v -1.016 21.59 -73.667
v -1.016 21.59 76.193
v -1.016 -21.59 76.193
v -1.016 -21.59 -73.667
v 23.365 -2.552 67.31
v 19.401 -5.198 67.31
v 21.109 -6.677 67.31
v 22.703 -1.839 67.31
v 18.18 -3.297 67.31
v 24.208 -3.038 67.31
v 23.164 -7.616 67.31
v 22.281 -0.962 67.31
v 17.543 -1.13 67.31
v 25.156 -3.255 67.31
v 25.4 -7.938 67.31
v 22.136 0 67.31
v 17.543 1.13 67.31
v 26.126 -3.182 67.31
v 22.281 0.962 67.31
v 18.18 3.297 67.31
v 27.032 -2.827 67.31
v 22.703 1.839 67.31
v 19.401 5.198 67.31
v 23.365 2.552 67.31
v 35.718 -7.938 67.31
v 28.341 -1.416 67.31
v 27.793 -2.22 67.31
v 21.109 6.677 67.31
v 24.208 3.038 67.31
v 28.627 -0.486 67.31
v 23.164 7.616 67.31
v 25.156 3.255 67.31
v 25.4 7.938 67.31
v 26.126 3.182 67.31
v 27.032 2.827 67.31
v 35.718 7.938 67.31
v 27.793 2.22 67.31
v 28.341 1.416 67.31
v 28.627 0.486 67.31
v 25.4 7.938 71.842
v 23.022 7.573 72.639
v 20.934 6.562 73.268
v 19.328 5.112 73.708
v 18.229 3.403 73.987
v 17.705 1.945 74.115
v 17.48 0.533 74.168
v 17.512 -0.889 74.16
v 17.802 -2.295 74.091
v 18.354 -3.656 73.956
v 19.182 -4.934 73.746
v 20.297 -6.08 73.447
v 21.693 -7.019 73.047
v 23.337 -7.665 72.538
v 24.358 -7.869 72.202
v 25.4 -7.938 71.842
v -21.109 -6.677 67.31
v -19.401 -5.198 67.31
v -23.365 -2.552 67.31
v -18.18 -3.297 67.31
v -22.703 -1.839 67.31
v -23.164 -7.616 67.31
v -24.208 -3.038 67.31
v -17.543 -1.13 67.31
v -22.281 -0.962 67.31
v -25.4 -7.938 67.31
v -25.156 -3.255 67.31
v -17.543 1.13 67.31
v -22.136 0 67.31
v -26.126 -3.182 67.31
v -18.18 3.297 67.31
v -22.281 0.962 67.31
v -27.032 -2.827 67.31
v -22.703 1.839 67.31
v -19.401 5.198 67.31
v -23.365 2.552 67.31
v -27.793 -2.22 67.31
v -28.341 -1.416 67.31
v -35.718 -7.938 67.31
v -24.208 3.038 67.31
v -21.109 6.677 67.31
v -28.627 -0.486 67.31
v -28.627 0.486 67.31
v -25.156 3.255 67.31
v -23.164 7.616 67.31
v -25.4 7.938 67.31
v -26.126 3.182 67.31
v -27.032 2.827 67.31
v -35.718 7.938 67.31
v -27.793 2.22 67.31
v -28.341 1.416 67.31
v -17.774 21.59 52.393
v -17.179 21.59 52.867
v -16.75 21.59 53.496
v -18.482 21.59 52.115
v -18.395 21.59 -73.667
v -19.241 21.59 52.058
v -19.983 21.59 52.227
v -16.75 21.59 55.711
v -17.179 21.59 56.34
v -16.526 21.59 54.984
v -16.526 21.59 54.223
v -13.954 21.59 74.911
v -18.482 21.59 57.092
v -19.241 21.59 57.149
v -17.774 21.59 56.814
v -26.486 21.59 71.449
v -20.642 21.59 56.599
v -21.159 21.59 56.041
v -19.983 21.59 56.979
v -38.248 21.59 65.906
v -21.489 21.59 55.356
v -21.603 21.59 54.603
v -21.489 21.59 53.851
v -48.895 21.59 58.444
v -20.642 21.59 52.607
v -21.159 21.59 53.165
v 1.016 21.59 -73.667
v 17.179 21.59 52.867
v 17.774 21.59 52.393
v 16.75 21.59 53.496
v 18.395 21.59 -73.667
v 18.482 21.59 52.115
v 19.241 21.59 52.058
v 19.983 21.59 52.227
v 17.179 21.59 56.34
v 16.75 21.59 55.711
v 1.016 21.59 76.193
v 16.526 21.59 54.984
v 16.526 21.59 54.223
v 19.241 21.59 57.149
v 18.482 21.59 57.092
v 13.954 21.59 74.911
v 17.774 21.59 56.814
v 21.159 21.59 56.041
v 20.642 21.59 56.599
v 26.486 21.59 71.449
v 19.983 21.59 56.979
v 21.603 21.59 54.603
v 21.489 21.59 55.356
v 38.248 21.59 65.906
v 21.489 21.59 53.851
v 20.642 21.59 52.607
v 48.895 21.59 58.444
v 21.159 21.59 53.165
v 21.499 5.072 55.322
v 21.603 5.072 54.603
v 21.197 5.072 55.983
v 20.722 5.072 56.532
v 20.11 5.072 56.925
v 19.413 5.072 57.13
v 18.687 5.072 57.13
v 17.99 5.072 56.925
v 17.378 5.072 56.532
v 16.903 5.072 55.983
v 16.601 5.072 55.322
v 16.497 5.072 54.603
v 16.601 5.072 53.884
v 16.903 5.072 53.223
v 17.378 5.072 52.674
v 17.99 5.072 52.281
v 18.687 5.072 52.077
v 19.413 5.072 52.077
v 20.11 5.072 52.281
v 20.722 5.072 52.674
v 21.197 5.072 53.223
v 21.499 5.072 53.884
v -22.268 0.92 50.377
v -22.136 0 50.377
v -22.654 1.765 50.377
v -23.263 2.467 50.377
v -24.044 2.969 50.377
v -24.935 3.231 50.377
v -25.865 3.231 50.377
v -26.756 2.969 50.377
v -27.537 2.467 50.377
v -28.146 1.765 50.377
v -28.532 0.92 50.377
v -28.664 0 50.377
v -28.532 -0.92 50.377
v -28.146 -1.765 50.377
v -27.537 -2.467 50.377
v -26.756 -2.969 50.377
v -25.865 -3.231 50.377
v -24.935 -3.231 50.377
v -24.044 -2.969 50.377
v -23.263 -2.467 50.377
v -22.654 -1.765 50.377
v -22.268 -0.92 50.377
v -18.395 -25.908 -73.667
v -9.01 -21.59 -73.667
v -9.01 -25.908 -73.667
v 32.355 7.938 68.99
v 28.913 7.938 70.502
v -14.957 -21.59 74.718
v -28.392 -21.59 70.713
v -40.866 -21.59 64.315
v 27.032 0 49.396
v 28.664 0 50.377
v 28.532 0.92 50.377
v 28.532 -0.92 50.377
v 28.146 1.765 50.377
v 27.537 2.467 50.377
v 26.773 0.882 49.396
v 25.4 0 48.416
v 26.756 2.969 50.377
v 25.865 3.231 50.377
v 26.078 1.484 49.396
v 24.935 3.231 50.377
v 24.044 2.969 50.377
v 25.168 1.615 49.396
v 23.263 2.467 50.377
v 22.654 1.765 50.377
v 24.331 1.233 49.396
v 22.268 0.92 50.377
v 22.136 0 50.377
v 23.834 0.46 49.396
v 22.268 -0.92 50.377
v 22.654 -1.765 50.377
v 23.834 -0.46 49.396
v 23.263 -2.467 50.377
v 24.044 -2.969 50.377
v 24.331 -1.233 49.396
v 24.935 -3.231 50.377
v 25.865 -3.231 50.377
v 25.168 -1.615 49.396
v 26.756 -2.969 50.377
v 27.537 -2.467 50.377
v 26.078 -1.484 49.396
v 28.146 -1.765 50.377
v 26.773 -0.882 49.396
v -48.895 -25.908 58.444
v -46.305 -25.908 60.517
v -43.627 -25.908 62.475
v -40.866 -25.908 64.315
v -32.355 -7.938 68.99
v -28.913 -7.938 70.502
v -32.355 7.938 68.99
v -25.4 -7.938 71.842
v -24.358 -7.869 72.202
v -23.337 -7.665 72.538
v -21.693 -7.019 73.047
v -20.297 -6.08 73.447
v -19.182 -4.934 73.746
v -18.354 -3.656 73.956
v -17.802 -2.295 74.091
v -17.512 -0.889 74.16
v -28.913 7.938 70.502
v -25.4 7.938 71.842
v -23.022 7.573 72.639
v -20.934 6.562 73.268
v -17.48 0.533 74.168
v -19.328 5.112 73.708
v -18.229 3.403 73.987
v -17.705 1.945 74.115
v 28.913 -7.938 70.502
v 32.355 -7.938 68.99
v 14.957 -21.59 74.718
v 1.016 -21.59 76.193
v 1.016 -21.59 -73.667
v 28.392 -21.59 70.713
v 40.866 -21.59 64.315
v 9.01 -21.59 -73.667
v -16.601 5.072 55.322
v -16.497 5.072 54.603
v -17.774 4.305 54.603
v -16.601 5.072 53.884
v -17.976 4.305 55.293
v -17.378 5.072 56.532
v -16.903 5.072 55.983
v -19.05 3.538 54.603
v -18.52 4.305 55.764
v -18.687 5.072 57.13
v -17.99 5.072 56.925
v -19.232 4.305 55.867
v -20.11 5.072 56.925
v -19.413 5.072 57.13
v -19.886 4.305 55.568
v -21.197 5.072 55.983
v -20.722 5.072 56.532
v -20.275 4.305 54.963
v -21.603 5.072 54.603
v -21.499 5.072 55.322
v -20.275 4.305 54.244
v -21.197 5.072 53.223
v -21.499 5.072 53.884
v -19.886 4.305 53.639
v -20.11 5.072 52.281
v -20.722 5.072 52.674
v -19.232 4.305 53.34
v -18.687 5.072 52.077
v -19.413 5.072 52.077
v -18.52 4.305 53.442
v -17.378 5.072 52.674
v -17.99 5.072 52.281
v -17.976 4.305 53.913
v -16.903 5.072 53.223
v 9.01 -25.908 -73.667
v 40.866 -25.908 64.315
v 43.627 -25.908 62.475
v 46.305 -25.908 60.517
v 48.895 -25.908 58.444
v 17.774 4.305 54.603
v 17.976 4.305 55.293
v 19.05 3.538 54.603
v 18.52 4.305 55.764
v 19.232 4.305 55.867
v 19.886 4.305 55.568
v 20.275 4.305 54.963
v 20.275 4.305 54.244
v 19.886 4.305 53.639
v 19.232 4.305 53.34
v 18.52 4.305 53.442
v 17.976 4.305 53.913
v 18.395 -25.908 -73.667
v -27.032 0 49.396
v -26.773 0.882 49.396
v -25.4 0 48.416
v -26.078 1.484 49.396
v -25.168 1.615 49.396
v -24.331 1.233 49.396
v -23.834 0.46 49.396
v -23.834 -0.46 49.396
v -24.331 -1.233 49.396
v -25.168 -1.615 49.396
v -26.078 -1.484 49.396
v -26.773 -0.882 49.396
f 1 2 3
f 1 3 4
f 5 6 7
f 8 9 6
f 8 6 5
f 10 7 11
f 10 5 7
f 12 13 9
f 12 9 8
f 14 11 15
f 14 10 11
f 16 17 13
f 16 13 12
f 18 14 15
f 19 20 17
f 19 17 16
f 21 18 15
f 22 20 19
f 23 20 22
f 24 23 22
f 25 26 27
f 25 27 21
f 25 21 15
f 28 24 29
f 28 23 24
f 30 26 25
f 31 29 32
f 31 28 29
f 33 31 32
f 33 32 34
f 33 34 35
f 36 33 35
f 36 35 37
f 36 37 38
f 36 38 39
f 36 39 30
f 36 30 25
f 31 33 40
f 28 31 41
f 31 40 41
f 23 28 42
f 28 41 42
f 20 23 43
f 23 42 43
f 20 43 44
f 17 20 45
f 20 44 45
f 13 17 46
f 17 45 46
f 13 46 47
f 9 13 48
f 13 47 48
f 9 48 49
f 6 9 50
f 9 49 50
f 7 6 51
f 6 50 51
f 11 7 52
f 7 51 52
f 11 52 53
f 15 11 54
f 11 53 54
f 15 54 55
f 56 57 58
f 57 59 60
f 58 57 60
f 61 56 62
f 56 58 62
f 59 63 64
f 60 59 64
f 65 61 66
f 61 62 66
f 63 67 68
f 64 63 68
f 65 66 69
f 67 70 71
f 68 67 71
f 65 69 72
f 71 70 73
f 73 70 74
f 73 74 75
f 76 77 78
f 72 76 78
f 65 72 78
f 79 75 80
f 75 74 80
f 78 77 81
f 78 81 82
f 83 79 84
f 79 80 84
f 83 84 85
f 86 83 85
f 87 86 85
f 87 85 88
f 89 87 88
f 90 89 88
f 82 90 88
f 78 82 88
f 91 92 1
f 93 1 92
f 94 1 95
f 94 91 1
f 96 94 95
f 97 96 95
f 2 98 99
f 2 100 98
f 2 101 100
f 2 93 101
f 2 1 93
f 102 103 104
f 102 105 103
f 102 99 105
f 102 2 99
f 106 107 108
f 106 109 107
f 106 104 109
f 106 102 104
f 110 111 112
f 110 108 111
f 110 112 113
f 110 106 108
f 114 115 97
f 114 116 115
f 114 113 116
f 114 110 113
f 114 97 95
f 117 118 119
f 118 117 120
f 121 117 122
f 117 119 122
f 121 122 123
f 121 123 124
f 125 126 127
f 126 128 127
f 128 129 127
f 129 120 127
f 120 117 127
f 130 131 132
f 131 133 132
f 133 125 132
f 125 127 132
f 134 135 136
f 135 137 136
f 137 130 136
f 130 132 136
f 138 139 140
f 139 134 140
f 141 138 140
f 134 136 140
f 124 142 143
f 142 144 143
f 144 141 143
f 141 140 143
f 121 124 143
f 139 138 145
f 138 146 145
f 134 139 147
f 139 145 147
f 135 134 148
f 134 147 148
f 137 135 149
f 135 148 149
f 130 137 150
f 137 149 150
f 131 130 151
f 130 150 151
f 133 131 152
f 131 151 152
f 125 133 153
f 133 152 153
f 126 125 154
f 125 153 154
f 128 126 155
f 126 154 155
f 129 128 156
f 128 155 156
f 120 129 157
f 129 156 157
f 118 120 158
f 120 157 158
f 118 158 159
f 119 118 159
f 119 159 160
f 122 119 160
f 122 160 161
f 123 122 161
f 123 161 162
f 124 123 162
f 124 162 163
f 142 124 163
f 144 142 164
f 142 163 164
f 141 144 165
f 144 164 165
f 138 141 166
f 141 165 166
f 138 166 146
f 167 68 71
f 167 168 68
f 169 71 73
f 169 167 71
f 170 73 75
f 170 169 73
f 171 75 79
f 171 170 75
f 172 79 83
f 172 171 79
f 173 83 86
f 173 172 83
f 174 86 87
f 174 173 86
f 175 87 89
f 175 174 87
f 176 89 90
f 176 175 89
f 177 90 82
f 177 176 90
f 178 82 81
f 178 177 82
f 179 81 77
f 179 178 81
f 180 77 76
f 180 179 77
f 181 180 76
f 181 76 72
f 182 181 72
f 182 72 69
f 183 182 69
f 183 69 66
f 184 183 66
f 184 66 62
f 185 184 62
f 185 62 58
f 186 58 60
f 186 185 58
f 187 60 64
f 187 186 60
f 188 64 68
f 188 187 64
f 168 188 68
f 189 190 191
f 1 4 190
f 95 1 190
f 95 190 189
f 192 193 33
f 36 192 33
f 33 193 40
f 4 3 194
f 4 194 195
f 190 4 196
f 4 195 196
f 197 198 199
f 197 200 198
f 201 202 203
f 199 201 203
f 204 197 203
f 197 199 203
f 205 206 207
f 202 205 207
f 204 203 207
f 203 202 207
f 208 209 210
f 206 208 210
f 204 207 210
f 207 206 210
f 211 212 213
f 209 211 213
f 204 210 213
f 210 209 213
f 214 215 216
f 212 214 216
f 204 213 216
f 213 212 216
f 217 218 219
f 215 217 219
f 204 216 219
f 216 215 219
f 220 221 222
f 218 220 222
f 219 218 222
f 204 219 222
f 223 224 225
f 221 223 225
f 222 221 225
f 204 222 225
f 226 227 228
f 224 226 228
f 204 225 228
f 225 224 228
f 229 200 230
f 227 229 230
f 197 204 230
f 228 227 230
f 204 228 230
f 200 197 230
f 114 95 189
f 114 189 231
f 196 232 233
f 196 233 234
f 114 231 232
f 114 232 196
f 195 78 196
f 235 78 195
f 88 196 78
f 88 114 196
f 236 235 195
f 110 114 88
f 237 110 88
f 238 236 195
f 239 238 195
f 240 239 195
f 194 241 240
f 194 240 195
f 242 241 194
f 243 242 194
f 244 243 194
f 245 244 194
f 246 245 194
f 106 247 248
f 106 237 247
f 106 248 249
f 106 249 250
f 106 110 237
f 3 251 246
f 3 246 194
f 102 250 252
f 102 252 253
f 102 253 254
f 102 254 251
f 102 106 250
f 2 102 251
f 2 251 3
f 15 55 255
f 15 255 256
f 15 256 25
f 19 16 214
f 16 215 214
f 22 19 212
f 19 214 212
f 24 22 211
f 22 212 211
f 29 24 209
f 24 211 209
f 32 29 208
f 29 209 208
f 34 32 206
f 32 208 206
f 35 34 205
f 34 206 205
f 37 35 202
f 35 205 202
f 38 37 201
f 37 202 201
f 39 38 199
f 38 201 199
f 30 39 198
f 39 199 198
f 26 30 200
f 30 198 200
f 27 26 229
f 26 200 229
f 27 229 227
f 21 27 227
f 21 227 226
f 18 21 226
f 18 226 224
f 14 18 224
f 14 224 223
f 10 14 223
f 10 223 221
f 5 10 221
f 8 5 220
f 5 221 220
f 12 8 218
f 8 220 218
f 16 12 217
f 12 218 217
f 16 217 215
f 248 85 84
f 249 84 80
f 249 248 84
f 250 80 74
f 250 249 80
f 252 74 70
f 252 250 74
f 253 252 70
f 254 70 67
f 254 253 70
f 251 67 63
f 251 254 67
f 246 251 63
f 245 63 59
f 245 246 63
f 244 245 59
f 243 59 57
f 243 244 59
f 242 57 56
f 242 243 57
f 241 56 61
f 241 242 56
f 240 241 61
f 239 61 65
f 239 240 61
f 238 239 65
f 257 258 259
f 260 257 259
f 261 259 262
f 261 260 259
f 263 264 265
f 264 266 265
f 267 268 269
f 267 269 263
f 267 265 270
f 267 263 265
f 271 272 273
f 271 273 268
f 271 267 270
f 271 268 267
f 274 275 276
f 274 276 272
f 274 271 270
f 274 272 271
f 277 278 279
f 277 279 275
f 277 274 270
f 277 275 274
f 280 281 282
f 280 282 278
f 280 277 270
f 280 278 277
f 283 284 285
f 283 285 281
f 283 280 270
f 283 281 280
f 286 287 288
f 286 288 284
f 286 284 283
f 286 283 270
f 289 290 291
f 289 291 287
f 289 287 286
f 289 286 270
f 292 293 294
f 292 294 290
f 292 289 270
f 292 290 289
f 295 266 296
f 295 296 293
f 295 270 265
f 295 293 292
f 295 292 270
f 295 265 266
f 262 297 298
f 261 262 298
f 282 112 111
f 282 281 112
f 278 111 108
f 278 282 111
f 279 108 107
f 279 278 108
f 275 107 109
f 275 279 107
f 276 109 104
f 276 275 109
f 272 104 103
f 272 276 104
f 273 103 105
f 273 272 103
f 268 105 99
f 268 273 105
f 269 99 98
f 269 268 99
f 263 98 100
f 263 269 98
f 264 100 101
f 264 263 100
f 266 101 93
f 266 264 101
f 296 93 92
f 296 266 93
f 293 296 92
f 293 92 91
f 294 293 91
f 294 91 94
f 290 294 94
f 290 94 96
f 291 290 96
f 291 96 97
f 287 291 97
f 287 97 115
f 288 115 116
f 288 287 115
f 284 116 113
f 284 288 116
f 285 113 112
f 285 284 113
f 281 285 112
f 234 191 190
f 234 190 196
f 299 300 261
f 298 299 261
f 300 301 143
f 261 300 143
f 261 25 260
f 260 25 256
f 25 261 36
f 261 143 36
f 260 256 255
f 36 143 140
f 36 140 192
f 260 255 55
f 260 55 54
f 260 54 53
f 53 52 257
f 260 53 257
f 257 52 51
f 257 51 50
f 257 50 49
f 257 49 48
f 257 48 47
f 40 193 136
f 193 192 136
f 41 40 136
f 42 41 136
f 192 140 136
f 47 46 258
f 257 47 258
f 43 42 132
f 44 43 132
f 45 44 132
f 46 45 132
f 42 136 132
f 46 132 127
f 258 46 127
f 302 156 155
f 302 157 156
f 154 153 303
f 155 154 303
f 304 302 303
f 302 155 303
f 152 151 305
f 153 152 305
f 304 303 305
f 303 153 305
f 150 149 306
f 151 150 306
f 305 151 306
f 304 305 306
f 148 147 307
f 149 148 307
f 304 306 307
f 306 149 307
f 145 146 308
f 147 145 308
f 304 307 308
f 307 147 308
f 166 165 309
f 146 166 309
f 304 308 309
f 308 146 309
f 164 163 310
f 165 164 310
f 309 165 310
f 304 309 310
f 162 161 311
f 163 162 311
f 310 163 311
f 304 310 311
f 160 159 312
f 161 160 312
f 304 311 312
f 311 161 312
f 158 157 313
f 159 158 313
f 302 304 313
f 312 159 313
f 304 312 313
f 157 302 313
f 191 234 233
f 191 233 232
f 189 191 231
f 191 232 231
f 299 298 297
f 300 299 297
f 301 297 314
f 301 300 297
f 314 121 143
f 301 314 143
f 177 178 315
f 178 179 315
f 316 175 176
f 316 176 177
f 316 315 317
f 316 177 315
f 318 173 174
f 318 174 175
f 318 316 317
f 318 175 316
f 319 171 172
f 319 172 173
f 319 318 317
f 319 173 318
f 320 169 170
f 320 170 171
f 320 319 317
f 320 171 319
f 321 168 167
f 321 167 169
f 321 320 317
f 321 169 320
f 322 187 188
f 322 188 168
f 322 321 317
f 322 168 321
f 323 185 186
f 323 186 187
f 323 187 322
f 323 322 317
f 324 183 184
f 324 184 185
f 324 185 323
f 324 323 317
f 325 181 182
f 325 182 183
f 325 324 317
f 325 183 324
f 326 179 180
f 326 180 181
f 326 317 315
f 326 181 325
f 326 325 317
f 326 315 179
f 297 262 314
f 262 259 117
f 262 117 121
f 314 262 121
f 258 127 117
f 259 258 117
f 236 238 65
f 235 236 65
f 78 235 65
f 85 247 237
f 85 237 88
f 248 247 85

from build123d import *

# Parameters (mm, degrees)
F1_DEPTH      = 21.59
F1_DEPTH_BACK = 25.908
F3_DEPTH      = 4.318
F6_DEPTH      = 8.89
F8_D          = 6.5278
F8_DEPTH      = 16.9333333333
F8_TIP        = 1.9611489744
F10_D         = 5.1054
F10_DEPTH     = 16.5184666667
F10_TIP       = 1.5338169022


with BuildPart() as f1:
    # F0 (on Front) → F1 (new body, two sides)
    with BuildSketch(Plane.XZ) as f1_sk:
        with BuildLine():
            ThreePointArc((48.895, 58.444152616), (26.4864943885, 71.4486222051), (1.016, 76.1932263656))
            Line((1.016, 76.1932263656), (1.016, -73.6667736344))
            Line((1.016, -73.6667736344), (18.3947894287, -73.6667736344))
            Line((18.3947894287, -73.6667736344), (48.895, 58.444152616))
        make_face()
    extrude(amount=-F1_DEPTH)
    extrude(f1_sk.sketch, amount=F1_DEPTH_BACK)

    # F2 (on face) → F3 (cut)
    with BuildSketch(Plane.XZ.offset(25.908)):
        with BuildLine():
            Line((1.016, -73.6667736344), (9.010264667, -73.6667736344))
            Line((9.010264667, -73.6667736344), (40.8658697787, 64.3150113677))
            ThreePointArc((40.8658697787, 64.3150113677), (21.7668498392, 73.0249563374), (1.016, 76.1932263656))
            Line((1.016, 76.1932263656), (1.016, -73.6667736344))
        make_face()
    extrude(amount=-F3_DEPTH, mode=Mode.SUBTRACT)

    # F5 (on offset) → F6 (cut)
    with BuildSketch(Plane.XY.offset(76.2)):
        with BuildLine():
            Line((35.7505, -7.9375), (35.7505, 7.9375))
            Line((35.7505, 7.9375), (25.4, 7.9375))
            ThreePointArc((25.4, 7.9375), (17.4625, 0), (25.4, -7.9375))
            Line((25.4, -7.9375), (35.7505, -7.9375))
        make_face()
    extrude(amount=-F6_DEPTH, mode=Mode.SUBTRACT)

    # F8
    with Locations(Plane.XY.offset(67.31)):
        with Locations((25.4, 0)):
            Hole(F8_D / 2, depth=F8_DEPTH)
            with Locations((0, 0, -(F8_DEPTH + F8_TIP / 2))):  # 118° drill point
                Cone(0, F8_D / 2, F8_TIP, mode=Mode.SUBTRACT)

    # F10
    with Locations(Plane(origin=(0, 21.59, 0), x_dir=(-1, 0, 0), z_dir=(0, 1, 0))):
        with Locations((-19.05, 54.6032263656)):
            Hole(F10_D / 2, depth=F10_DEPTH)
            with Locations((0, 0, -(F10_DEPTH + F10_TIP / 2))):  # 118° drill point
                Cone(0, F10_D / 2, F10_TIP, mode=Mode.SUBTRACT)


with BuildPart() as f11_1:
    # F11: instance of F1
    add(f1.part.mirror(Plane.YZ))


solid = Compound([f1.part, f11_1.part])
